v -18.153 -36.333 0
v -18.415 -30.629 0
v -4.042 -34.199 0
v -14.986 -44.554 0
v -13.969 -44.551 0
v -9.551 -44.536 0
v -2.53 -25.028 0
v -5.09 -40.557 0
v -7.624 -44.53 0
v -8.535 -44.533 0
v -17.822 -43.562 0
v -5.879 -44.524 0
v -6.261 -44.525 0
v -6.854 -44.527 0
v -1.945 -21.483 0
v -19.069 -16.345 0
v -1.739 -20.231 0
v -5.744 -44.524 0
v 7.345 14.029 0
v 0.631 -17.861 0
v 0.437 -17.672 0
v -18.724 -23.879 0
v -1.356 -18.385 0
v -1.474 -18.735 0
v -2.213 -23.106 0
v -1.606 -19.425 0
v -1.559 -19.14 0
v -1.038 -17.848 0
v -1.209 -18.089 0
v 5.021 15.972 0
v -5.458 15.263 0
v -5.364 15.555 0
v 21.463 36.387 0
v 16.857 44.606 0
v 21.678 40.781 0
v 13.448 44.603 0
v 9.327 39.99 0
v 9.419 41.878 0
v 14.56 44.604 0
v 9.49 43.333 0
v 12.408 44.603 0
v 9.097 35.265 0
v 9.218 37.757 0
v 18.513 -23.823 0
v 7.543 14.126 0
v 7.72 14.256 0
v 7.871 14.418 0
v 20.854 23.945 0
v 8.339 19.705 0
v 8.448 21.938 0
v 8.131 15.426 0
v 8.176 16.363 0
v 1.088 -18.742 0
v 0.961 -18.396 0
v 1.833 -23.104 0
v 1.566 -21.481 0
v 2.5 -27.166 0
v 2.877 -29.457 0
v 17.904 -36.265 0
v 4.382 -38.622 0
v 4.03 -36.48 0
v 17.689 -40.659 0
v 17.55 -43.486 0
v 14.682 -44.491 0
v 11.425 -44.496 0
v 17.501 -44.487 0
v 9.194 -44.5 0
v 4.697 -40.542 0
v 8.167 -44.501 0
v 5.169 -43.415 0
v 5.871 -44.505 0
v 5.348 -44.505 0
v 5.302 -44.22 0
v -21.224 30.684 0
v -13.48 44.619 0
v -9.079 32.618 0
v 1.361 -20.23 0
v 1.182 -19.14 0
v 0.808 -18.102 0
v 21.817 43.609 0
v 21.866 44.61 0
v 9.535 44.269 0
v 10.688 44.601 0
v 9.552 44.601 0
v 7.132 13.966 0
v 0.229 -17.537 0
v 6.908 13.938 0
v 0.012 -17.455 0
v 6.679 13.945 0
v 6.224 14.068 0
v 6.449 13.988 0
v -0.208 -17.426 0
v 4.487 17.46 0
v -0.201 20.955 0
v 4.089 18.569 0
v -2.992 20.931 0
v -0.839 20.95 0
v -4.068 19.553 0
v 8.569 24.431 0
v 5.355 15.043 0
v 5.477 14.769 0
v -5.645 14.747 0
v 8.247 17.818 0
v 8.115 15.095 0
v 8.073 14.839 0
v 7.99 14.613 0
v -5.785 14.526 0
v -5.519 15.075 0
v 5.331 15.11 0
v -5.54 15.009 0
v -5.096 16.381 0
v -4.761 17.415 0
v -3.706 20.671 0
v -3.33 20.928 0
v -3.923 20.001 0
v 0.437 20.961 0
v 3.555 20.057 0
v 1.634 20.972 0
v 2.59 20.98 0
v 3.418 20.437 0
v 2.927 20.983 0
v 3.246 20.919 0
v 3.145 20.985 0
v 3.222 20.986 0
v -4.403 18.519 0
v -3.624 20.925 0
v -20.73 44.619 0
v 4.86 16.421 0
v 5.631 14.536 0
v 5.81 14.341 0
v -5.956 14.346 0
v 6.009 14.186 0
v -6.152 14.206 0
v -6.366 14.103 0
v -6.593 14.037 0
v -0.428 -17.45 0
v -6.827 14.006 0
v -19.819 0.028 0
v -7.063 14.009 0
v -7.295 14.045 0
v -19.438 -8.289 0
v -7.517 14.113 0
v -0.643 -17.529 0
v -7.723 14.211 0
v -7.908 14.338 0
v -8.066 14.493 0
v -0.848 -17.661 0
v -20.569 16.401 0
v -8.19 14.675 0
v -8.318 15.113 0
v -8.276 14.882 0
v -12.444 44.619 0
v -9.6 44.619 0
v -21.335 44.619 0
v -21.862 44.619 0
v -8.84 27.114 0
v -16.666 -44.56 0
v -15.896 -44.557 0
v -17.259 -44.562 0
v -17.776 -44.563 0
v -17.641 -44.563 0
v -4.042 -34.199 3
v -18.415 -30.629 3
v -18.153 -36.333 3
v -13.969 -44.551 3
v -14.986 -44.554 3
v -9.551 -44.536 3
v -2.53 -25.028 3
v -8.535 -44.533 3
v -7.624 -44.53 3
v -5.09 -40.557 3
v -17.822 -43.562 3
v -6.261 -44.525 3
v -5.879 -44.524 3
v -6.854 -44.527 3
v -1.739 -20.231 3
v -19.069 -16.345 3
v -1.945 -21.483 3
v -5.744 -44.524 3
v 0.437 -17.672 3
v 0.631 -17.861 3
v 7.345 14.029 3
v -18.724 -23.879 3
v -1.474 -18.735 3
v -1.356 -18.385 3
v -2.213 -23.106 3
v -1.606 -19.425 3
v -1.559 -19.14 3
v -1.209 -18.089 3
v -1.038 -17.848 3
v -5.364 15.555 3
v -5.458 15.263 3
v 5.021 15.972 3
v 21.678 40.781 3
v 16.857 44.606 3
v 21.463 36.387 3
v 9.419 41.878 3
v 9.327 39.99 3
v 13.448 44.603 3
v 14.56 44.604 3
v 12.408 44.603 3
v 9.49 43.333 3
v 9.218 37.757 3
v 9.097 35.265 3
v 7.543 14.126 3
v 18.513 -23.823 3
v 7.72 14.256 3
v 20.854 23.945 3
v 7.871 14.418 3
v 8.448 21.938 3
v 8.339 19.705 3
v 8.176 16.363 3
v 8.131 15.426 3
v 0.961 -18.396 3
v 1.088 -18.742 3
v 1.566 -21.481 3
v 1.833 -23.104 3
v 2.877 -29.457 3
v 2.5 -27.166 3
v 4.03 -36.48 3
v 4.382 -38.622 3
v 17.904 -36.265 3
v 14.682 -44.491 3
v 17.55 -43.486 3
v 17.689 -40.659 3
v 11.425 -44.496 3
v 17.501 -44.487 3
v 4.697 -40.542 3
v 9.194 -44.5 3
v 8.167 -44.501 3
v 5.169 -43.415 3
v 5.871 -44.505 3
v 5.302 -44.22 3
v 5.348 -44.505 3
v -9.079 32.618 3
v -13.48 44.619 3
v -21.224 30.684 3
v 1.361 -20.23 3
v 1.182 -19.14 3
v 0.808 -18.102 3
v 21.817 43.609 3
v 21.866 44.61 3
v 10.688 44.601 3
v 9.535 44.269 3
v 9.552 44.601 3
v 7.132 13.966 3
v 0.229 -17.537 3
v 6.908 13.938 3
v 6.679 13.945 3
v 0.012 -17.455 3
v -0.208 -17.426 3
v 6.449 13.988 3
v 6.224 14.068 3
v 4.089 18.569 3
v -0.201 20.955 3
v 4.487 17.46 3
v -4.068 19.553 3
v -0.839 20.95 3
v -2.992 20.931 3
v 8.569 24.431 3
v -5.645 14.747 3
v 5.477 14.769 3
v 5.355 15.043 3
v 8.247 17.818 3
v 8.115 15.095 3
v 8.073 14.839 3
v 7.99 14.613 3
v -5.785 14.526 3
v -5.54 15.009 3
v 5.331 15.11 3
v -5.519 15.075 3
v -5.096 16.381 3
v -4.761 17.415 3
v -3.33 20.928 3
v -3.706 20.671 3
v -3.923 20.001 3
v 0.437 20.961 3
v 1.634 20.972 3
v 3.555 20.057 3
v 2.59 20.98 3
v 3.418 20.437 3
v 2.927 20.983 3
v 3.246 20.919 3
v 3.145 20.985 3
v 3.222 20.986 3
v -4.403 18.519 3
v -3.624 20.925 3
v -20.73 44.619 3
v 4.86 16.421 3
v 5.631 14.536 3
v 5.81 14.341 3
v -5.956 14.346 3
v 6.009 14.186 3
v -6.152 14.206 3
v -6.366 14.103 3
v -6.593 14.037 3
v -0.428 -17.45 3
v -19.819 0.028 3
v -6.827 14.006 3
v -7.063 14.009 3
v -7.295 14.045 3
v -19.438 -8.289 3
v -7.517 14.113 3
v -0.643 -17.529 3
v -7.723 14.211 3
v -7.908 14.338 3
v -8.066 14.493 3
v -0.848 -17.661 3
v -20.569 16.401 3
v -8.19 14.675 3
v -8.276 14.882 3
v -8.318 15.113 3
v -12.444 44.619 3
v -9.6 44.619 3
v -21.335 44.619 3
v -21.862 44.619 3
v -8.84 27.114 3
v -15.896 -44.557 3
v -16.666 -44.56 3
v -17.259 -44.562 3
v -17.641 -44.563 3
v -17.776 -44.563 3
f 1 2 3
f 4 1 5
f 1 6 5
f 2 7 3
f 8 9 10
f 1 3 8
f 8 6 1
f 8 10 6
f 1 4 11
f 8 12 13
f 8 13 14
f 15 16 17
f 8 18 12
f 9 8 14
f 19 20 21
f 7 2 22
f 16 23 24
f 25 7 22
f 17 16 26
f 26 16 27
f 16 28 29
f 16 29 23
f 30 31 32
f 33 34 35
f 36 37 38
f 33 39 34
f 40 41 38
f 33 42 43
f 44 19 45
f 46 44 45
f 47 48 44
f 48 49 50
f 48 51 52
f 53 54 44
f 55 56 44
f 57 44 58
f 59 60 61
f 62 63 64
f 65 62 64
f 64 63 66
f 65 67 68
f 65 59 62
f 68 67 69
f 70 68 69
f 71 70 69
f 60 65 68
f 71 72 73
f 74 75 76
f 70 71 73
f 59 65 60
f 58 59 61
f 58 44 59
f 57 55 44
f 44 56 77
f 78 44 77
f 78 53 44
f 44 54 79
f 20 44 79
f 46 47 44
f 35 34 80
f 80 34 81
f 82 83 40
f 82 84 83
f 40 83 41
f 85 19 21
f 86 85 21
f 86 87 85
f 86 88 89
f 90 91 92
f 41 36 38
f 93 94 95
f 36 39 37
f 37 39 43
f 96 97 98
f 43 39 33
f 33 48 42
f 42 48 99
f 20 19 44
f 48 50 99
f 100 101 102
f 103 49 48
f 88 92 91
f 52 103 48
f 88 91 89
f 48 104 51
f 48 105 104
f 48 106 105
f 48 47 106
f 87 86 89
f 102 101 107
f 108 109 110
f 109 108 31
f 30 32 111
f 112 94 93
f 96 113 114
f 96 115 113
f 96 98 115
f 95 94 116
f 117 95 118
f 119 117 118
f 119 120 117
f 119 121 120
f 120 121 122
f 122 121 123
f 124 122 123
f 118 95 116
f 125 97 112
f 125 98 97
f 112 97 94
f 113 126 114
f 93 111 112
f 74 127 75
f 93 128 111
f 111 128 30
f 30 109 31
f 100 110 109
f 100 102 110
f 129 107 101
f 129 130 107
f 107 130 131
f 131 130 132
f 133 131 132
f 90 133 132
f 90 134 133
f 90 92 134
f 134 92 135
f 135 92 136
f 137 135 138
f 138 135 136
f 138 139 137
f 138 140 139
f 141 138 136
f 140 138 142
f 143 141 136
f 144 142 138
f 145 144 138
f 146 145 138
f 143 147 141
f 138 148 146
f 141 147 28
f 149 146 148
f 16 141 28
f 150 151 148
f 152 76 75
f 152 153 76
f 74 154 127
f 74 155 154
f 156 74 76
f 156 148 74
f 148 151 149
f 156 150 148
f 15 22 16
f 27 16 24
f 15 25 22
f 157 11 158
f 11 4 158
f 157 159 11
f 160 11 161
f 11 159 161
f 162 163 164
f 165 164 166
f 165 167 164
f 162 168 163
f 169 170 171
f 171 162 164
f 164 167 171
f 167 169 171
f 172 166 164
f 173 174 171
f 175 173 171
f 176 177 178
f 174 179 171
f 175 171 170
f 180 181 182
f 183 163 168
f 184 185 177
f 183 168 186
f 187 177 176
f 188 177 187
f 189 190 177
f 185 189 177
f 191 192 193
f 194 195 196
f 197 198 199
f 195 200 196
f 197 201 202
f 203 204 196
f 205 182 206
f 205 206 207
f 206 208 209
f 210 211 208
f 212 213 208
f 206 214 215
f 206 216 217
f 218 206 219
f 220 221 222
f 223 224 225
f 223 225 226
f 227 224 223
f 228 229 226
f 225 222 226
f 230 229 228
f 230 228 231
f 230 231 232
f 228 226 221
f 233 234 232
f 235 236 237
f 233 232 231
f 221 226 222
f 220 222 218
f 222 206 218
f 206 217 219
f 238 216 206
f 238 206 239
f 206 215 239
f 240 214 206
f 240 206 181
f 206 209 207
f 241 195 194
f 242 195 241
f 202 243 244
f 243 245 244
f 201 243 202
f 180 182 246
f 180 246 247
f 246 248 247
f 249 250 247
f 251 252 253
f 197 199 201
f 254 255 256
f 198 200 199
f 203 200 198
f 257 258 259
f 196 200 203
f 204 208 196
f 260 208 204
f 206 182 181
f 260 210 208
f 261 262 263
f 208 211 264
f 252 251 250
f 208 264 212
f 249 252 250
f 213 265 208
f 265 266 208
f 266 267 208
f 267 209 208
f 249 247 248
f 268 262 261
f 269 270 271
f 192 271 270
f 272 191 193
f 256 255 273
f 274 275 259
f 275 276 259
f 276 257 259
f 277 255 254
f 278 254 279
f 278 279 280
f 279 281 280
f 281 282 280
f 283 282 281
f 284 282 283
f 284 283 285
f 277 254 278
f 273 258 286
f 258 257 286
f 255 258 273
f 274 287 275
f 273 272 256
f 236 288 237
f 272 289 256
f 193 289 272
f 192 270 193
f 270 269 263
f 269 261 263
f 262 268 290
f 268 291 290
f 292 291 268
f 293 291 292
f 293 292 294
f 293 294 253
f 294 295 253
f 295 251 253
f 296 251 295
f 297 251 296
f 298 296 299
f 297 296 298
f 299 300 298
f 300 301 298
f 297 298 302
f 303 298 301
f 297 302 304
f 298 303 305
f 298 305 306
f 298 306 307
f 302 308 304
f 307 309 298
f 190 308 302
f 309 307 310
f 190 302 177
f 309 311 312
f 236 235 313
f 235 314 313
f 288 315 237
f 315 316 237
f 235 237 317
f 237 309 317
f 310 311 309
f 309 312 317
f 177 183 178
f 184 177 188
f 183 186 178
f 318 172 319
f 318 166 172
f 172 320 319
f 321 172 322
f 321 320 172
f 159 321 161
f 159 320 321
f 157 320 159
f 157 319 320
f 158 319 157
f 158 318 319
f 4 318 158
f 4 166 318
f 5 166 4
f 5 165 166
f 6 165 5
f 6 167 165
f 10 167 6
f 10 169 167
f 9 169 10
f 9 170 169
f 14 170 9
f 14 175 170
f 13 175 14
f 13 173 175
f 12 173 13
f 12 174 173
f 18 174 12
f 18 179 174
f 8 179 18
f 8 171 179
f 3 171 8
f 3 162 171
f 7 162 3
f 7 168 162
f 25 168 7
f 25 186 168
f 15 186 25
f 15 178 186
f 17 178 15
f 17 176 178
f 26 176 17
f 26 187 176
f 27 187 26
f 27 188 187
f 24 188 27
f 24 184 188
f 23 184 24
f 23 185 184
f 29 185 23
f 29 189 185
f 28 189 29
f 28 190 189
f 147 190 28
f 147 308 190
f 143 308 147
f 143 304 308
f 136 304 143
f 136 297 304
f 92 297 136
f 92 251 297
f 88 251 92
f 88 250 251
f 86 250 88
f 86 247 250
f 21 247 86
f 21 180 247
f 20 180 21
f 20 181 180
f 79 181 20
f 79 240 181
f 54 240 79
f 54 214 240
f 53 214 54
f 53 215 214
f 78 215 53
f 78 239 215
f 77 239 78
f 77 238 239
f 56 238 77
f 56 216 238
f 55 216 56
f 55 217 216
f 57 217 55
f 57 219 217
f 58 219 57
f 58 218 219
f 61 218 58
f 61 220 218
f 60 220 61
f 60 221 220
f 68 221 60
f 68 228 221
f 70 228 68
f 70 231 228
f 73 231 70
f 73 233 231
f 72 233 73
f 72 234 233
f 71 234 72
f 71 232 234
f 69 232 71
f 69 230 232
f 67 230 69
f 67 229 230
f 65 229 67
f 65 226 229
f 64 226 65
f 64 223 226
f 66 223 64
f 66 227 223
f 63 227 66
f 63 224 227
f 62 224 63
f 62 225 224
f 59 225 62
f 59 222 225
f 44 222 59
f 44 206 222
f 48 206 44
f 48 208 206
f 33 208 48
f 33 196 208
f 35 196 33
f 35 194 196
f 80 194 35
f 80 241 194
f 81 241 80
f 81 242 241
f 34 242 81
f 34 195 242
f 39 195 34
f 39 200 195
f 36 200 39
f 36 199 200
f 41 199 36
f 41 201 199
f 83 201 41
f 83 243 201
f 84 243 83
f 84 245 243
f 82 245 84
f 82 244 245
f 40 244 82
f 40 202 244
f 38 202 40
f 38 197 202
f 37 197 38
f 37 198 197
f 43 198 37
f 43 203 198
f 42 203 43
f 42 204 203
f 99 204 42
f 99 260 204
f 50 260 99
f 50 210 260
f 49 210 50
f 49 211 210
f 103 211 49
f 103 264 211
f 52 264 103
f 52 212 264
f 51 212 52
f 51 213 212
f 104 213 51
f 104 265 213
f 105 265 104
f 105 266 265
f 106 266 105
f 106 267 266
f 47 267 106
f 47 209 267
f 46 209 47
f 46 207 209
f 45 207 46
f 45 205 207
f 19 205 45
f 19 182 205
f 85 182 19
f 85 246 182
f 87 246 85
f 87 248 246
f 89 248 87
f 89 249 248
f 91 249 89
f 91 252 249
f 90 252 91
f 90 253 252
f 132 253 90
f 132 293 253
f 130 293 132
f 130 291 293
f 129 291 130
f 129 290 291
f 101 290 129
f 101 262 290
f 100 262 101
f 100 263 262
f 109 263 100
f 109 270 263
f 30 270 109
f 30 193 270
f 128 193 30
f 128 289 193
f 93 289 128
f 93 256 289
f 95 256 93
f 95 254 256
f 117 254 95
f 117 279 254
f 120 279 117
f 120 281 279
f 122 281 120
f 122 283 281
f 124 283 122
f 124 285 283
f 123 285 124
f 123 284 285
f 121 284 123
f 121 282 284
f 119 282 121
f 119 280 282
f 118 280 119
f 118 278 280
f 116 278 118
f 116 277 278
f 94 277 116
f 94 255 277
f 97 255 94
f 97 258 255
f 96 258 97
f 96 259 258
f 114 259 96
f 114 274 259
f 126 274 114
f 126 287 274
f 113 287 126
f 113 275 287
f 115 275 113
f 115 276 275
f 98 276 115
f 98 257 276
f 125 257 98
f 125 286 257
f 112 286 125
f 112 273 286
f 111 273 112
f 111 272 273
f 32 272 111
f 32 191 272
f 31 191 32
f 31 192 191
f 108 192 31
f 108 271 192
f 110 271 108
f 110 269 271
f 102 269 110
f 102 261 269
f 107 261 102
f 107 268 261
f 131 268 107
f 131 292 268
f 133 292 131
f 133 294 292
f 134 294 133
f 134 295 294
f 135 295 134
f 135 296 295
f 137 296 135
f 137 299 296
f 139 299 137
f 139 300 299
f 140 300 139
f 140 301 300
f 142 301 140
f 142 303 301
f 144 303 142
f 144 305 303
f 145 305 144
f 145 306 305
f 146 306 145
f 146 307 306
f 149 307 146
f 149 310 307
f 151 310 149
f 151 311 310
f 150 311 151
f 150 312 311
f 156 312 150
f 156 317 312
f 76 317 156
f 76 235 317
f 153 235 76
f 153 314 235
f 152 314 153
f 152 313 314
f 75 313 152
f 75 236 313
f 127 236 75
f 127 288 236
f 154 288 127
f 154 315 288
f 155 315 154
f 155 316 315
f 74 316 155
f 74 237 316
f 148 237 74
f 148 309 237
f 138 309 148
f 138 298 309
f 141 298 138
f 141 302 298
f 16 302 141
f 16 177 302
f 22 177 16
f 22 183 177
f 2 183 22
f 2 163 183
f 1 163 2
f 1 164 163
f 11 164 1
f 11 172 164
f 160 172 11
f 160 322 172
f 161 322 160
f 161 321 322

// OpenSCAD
// Generated from 交通部公路局（原交通部公路總局）「新式號牌使用之英文字、數字字體」author trace
fudge = 0.1;

module glyph_2012_W(h = 3) {
  difference() {
    linear_extrude(height = h)
      polygon(points = [[-21.8622, 44.6191], [-21.8163, 43.6176], [-21.6866, 40.7871], [-21.4851, 36.3889], [-21.2237, 30.6844], [-20.9145, 23.9347], [-20.5694, 16.4013], [-20.2003, 8.3452], [-19.8192, 0.0279], [-19.4382, -8.2894], [-19.0691, -16.3454], [-18.7239, -23.8789], [-18.4147, -30.6286], [-18.1533, -36.3331], [-17.9518, -40.7313], [-17.8221, -43.5618], [-17.7763, -44.5633], [-17.6411, -44.5629], [-17.2593, -44.5616], [-16.6659, -44.5597], [-15.8962, -44.5571], [-14.9856, -44.5541], [-13.9692, -44.5508], [-12.8823, -44.5472], [-11.7602, -44.5435], [-10.638, -44.5398], [-9.5511, -44.5362], [-8.5348, -44.5328], [-7.6241, -44.5298], [-6.8545, -44.5273], [-6.2611, -44.5253], [-5.8792, -44.5241], [-5.7441, -44.5236], [-5.6971, -44.2386], [-5.5643, -43.4329], [-5.3579, -42.1811], [-5.0902, -40.5575], [-4.7735, -38.6364], [-4.42, -36.4922], [-4.042, -34.1993], [-3.6517, -31.832], [-3.2614, -29.4647], [-2.8834, -27.1718], [-2.5299, -25.0276], [-2.2131, -23.1065], [-1.9454, -21.4829], [-1.7391, -20.2311], [-1.6062, -19.4255], [-1.5592, -19.1404], [-1.4742, -18.7351], [-1.3558, -18.3847], [-1.2089, -18.0891], [-1.038, -17.8481], [-0.8478, -17.6615], [-0.643, -17.529], [-0.4282, -17.4505], [-0.2082, -17.4258], [0.0124, -17.4547], [0.229, -17.537], [0.4369, -17.6724], [0.6313, -17.8608], [0.8077, -18.1021], [0.9614, -18.3958], [1.0877, -18.742], [1.1819, -19.1404], [1.2287, -19.4253], [1.361, -20.2303], [1.5664, -21.4812], [1.8329, -23.1037], [2.1483, -25.0234], [2.5003, -27.166], [2.8766, -29.4573], [3.2652, -31.8229], [3.6538, -34.1884], [4.0302, -36.4797], [4.3821, -38.6224], [4.6975, -40.5421], [4.964, -42.1645], [5.1695, -43.4154], [5.3017, -44.2205], [5.3485, -44.5053], [5.485, -44.5051], [5.8707, -44.5046], [6.47, -44.5037], [7.2473, -44.5025], [8.1671, -44.5011], [9.1936, -44.4996], [10.2914, -44.4979], [11.4248, -44.4962], [12.5581, -44.4945], [13.6559, -44.4929], [14.6824, -44.4914], [15.6022, -44.49], [16.3795, -44.4888], [16.9788, -44.4879], [17.3645, -44.4873], [17.501, -44.4871], [17.55, -43.4865], [17.6886, -40.6588], [17.9038, -36.2648], [18.183, -30.5658], [18.5134, -23.8226], [18.8821, -16.2963], [19.2764, -8.248], [19.6835, 0.0613], [20.0906, 8.3706], [20.4849, 16.4189], [20.8536, 23.9451], [21.184, 30.6883], [21.4632, 36.3874], [21.6784, 40.7813], [21.817, 43.6091], [21.866, 44.6097], [21.7277, 44.6096], [21.3369, 44.6093], [20.7296, 44.6089], [19.9419, 44.6083], [19.0099, 44.6076], [17.9697, 44.6068], [16.8573, 44.606], [15.7088, 44.6052], [14.5604, 44.6044], [13.448, 44.6035], [12.4077, 44.6028], [11.4757, 44.6021], [10.6881, 44.6015], [10.0808, 44.6011], [9.6899, 44.6008], [9.5516, 44.6007], [9.5355, 44.2693], [9.4899, 43.3329], [9.419, 41.8778], [9.3271, 39.9904], [9.2184, 37.7573], [9.097, 35.2649], [8.9672, 32.5996], [8.8332, 29.8478], [8.6992, 27.0961], [8.5694, 24.4308], [8.448, 21.9384], [8.3393, 19.7053], [8.2473, 17.8179], [8.1765, 16.3628], [8.1309, 15.4264], [8.1147, 15.095], [8.0732, 14.8388], [7.9901, 14.613], [7.8707, 14.4185], [7.7199, 14.2558], [7.5432, 14.1258], [7.3455, 14.029], [7.132, 13.9662], [6.908, 13.938], [6.6786, 13.9452], [6.4489, 13.9885], [6.2241, 14.0684], [6.0094, 14.1858], [5.81, 14.3413], [5.631, 14.5356], [5.4775, 14.7694], [5.3548, 15.0433], [5.3308, 15.11], [5.2631, 15.2986], [5.1579, 15.5917], [5.0215, 15.9718], [4.86, 16.4215], [4.6798, 16.9235], [4.4871, 17.4603], [4.2882, 18.0145], [4.0893, 18.5687], [3.8966, 19.1055], [3.7164, 19.6074], [3.5549, 20.0572], [3.4185, 20.4373], [3.3133, 20.7303], [3.2456, 20.9189], [3.2216, 20.9856], [3.1448, 20.985], [2.9275, 20.983], [2.5899, 20.9801], [2.152, 20.9762], [1.634, 20.9716], [1.0557, 20.9665], [0.4374, 20.961], [-0.201, 20.9553], [-0.8395, 20.9497], [-1.4578, 20.9442], [-2.0361, 20.9391], [-2.5541, 20.9345], [-2.992, 20.9306], [-3.3296, 20.9277], [-3.5468, 20.9257], [-3.6237, 20.925], [-3.6452, 20.8586], [-3.7061, 20.6708], [-3.8006, 20.379], [-3.9232, 20.0006], [-4.0683, 19.5528], [-4.2302, 19.053], [-4.4033, 18.5186], [-4.5821, 17.9668], [-4.7609, 17.415], [-4.934, 16.8806], [-5.0959, 16.3808], [-5.241, 15.933], [-5.3636, 15.5546], [-5.4581, 15.2628], [-5.519, 15.075], [-5.5405, 15.0086], [-5.645, 14.7467], [-5.7855, 14.5264], [-5.9563, 14.3465], [-6.1516, 14.2057], [-6.3657, 14.1028], [-6.5928, 14.0366], [-6.8273, 14.0057], [-7.0633, 14.0089], [-7.2951, 14.045], [-7.517, 14.1127], [-7.7232, 14.2107], [-7.908, 14.3379], [-8.0656, 14.4929], [-8.1904, 14.6746], [-8.2765, 14.8816], [-8.3182, 15.1127], [-8.3326, 15.4441], [-8.3733, 16.3806], [-8.4365, 17.8357], [-8.5185, 19.7231], [-8.6155, 21.9563], [-8.7238, 24.4488], [-8.8396, 27.1142], [-8.9591, 29.866], [-9.0786, 32.6178], [-9.1944, 35.2832], [-9.3027, 37.7757], [-9.3997, 40.0089], [-9.4817, 41.8963], [-9.5449, 43.3514], [-9.5856, 44.2879], [-9.6, 44.6193], [-9.7377, 44.6193], [-10.1269, 44.6193], [-10.7316, 44.6193], [-11.516, 44.6193], [-12.444, 44.6193], [-13.4798, 44.6192], [-14.5875, 44.6192], [-15.7311, 44.6192], [-16.8747, 44.6192], [-17.9823, 44.6192], [-19.0182, 44.6192], [-19.9462, 44.6192], [-20.7305, 44.6192], [-21.3353, 44.6191], [-21.7245, 44.6191]]);
  }
}

glyph_2012_W();
